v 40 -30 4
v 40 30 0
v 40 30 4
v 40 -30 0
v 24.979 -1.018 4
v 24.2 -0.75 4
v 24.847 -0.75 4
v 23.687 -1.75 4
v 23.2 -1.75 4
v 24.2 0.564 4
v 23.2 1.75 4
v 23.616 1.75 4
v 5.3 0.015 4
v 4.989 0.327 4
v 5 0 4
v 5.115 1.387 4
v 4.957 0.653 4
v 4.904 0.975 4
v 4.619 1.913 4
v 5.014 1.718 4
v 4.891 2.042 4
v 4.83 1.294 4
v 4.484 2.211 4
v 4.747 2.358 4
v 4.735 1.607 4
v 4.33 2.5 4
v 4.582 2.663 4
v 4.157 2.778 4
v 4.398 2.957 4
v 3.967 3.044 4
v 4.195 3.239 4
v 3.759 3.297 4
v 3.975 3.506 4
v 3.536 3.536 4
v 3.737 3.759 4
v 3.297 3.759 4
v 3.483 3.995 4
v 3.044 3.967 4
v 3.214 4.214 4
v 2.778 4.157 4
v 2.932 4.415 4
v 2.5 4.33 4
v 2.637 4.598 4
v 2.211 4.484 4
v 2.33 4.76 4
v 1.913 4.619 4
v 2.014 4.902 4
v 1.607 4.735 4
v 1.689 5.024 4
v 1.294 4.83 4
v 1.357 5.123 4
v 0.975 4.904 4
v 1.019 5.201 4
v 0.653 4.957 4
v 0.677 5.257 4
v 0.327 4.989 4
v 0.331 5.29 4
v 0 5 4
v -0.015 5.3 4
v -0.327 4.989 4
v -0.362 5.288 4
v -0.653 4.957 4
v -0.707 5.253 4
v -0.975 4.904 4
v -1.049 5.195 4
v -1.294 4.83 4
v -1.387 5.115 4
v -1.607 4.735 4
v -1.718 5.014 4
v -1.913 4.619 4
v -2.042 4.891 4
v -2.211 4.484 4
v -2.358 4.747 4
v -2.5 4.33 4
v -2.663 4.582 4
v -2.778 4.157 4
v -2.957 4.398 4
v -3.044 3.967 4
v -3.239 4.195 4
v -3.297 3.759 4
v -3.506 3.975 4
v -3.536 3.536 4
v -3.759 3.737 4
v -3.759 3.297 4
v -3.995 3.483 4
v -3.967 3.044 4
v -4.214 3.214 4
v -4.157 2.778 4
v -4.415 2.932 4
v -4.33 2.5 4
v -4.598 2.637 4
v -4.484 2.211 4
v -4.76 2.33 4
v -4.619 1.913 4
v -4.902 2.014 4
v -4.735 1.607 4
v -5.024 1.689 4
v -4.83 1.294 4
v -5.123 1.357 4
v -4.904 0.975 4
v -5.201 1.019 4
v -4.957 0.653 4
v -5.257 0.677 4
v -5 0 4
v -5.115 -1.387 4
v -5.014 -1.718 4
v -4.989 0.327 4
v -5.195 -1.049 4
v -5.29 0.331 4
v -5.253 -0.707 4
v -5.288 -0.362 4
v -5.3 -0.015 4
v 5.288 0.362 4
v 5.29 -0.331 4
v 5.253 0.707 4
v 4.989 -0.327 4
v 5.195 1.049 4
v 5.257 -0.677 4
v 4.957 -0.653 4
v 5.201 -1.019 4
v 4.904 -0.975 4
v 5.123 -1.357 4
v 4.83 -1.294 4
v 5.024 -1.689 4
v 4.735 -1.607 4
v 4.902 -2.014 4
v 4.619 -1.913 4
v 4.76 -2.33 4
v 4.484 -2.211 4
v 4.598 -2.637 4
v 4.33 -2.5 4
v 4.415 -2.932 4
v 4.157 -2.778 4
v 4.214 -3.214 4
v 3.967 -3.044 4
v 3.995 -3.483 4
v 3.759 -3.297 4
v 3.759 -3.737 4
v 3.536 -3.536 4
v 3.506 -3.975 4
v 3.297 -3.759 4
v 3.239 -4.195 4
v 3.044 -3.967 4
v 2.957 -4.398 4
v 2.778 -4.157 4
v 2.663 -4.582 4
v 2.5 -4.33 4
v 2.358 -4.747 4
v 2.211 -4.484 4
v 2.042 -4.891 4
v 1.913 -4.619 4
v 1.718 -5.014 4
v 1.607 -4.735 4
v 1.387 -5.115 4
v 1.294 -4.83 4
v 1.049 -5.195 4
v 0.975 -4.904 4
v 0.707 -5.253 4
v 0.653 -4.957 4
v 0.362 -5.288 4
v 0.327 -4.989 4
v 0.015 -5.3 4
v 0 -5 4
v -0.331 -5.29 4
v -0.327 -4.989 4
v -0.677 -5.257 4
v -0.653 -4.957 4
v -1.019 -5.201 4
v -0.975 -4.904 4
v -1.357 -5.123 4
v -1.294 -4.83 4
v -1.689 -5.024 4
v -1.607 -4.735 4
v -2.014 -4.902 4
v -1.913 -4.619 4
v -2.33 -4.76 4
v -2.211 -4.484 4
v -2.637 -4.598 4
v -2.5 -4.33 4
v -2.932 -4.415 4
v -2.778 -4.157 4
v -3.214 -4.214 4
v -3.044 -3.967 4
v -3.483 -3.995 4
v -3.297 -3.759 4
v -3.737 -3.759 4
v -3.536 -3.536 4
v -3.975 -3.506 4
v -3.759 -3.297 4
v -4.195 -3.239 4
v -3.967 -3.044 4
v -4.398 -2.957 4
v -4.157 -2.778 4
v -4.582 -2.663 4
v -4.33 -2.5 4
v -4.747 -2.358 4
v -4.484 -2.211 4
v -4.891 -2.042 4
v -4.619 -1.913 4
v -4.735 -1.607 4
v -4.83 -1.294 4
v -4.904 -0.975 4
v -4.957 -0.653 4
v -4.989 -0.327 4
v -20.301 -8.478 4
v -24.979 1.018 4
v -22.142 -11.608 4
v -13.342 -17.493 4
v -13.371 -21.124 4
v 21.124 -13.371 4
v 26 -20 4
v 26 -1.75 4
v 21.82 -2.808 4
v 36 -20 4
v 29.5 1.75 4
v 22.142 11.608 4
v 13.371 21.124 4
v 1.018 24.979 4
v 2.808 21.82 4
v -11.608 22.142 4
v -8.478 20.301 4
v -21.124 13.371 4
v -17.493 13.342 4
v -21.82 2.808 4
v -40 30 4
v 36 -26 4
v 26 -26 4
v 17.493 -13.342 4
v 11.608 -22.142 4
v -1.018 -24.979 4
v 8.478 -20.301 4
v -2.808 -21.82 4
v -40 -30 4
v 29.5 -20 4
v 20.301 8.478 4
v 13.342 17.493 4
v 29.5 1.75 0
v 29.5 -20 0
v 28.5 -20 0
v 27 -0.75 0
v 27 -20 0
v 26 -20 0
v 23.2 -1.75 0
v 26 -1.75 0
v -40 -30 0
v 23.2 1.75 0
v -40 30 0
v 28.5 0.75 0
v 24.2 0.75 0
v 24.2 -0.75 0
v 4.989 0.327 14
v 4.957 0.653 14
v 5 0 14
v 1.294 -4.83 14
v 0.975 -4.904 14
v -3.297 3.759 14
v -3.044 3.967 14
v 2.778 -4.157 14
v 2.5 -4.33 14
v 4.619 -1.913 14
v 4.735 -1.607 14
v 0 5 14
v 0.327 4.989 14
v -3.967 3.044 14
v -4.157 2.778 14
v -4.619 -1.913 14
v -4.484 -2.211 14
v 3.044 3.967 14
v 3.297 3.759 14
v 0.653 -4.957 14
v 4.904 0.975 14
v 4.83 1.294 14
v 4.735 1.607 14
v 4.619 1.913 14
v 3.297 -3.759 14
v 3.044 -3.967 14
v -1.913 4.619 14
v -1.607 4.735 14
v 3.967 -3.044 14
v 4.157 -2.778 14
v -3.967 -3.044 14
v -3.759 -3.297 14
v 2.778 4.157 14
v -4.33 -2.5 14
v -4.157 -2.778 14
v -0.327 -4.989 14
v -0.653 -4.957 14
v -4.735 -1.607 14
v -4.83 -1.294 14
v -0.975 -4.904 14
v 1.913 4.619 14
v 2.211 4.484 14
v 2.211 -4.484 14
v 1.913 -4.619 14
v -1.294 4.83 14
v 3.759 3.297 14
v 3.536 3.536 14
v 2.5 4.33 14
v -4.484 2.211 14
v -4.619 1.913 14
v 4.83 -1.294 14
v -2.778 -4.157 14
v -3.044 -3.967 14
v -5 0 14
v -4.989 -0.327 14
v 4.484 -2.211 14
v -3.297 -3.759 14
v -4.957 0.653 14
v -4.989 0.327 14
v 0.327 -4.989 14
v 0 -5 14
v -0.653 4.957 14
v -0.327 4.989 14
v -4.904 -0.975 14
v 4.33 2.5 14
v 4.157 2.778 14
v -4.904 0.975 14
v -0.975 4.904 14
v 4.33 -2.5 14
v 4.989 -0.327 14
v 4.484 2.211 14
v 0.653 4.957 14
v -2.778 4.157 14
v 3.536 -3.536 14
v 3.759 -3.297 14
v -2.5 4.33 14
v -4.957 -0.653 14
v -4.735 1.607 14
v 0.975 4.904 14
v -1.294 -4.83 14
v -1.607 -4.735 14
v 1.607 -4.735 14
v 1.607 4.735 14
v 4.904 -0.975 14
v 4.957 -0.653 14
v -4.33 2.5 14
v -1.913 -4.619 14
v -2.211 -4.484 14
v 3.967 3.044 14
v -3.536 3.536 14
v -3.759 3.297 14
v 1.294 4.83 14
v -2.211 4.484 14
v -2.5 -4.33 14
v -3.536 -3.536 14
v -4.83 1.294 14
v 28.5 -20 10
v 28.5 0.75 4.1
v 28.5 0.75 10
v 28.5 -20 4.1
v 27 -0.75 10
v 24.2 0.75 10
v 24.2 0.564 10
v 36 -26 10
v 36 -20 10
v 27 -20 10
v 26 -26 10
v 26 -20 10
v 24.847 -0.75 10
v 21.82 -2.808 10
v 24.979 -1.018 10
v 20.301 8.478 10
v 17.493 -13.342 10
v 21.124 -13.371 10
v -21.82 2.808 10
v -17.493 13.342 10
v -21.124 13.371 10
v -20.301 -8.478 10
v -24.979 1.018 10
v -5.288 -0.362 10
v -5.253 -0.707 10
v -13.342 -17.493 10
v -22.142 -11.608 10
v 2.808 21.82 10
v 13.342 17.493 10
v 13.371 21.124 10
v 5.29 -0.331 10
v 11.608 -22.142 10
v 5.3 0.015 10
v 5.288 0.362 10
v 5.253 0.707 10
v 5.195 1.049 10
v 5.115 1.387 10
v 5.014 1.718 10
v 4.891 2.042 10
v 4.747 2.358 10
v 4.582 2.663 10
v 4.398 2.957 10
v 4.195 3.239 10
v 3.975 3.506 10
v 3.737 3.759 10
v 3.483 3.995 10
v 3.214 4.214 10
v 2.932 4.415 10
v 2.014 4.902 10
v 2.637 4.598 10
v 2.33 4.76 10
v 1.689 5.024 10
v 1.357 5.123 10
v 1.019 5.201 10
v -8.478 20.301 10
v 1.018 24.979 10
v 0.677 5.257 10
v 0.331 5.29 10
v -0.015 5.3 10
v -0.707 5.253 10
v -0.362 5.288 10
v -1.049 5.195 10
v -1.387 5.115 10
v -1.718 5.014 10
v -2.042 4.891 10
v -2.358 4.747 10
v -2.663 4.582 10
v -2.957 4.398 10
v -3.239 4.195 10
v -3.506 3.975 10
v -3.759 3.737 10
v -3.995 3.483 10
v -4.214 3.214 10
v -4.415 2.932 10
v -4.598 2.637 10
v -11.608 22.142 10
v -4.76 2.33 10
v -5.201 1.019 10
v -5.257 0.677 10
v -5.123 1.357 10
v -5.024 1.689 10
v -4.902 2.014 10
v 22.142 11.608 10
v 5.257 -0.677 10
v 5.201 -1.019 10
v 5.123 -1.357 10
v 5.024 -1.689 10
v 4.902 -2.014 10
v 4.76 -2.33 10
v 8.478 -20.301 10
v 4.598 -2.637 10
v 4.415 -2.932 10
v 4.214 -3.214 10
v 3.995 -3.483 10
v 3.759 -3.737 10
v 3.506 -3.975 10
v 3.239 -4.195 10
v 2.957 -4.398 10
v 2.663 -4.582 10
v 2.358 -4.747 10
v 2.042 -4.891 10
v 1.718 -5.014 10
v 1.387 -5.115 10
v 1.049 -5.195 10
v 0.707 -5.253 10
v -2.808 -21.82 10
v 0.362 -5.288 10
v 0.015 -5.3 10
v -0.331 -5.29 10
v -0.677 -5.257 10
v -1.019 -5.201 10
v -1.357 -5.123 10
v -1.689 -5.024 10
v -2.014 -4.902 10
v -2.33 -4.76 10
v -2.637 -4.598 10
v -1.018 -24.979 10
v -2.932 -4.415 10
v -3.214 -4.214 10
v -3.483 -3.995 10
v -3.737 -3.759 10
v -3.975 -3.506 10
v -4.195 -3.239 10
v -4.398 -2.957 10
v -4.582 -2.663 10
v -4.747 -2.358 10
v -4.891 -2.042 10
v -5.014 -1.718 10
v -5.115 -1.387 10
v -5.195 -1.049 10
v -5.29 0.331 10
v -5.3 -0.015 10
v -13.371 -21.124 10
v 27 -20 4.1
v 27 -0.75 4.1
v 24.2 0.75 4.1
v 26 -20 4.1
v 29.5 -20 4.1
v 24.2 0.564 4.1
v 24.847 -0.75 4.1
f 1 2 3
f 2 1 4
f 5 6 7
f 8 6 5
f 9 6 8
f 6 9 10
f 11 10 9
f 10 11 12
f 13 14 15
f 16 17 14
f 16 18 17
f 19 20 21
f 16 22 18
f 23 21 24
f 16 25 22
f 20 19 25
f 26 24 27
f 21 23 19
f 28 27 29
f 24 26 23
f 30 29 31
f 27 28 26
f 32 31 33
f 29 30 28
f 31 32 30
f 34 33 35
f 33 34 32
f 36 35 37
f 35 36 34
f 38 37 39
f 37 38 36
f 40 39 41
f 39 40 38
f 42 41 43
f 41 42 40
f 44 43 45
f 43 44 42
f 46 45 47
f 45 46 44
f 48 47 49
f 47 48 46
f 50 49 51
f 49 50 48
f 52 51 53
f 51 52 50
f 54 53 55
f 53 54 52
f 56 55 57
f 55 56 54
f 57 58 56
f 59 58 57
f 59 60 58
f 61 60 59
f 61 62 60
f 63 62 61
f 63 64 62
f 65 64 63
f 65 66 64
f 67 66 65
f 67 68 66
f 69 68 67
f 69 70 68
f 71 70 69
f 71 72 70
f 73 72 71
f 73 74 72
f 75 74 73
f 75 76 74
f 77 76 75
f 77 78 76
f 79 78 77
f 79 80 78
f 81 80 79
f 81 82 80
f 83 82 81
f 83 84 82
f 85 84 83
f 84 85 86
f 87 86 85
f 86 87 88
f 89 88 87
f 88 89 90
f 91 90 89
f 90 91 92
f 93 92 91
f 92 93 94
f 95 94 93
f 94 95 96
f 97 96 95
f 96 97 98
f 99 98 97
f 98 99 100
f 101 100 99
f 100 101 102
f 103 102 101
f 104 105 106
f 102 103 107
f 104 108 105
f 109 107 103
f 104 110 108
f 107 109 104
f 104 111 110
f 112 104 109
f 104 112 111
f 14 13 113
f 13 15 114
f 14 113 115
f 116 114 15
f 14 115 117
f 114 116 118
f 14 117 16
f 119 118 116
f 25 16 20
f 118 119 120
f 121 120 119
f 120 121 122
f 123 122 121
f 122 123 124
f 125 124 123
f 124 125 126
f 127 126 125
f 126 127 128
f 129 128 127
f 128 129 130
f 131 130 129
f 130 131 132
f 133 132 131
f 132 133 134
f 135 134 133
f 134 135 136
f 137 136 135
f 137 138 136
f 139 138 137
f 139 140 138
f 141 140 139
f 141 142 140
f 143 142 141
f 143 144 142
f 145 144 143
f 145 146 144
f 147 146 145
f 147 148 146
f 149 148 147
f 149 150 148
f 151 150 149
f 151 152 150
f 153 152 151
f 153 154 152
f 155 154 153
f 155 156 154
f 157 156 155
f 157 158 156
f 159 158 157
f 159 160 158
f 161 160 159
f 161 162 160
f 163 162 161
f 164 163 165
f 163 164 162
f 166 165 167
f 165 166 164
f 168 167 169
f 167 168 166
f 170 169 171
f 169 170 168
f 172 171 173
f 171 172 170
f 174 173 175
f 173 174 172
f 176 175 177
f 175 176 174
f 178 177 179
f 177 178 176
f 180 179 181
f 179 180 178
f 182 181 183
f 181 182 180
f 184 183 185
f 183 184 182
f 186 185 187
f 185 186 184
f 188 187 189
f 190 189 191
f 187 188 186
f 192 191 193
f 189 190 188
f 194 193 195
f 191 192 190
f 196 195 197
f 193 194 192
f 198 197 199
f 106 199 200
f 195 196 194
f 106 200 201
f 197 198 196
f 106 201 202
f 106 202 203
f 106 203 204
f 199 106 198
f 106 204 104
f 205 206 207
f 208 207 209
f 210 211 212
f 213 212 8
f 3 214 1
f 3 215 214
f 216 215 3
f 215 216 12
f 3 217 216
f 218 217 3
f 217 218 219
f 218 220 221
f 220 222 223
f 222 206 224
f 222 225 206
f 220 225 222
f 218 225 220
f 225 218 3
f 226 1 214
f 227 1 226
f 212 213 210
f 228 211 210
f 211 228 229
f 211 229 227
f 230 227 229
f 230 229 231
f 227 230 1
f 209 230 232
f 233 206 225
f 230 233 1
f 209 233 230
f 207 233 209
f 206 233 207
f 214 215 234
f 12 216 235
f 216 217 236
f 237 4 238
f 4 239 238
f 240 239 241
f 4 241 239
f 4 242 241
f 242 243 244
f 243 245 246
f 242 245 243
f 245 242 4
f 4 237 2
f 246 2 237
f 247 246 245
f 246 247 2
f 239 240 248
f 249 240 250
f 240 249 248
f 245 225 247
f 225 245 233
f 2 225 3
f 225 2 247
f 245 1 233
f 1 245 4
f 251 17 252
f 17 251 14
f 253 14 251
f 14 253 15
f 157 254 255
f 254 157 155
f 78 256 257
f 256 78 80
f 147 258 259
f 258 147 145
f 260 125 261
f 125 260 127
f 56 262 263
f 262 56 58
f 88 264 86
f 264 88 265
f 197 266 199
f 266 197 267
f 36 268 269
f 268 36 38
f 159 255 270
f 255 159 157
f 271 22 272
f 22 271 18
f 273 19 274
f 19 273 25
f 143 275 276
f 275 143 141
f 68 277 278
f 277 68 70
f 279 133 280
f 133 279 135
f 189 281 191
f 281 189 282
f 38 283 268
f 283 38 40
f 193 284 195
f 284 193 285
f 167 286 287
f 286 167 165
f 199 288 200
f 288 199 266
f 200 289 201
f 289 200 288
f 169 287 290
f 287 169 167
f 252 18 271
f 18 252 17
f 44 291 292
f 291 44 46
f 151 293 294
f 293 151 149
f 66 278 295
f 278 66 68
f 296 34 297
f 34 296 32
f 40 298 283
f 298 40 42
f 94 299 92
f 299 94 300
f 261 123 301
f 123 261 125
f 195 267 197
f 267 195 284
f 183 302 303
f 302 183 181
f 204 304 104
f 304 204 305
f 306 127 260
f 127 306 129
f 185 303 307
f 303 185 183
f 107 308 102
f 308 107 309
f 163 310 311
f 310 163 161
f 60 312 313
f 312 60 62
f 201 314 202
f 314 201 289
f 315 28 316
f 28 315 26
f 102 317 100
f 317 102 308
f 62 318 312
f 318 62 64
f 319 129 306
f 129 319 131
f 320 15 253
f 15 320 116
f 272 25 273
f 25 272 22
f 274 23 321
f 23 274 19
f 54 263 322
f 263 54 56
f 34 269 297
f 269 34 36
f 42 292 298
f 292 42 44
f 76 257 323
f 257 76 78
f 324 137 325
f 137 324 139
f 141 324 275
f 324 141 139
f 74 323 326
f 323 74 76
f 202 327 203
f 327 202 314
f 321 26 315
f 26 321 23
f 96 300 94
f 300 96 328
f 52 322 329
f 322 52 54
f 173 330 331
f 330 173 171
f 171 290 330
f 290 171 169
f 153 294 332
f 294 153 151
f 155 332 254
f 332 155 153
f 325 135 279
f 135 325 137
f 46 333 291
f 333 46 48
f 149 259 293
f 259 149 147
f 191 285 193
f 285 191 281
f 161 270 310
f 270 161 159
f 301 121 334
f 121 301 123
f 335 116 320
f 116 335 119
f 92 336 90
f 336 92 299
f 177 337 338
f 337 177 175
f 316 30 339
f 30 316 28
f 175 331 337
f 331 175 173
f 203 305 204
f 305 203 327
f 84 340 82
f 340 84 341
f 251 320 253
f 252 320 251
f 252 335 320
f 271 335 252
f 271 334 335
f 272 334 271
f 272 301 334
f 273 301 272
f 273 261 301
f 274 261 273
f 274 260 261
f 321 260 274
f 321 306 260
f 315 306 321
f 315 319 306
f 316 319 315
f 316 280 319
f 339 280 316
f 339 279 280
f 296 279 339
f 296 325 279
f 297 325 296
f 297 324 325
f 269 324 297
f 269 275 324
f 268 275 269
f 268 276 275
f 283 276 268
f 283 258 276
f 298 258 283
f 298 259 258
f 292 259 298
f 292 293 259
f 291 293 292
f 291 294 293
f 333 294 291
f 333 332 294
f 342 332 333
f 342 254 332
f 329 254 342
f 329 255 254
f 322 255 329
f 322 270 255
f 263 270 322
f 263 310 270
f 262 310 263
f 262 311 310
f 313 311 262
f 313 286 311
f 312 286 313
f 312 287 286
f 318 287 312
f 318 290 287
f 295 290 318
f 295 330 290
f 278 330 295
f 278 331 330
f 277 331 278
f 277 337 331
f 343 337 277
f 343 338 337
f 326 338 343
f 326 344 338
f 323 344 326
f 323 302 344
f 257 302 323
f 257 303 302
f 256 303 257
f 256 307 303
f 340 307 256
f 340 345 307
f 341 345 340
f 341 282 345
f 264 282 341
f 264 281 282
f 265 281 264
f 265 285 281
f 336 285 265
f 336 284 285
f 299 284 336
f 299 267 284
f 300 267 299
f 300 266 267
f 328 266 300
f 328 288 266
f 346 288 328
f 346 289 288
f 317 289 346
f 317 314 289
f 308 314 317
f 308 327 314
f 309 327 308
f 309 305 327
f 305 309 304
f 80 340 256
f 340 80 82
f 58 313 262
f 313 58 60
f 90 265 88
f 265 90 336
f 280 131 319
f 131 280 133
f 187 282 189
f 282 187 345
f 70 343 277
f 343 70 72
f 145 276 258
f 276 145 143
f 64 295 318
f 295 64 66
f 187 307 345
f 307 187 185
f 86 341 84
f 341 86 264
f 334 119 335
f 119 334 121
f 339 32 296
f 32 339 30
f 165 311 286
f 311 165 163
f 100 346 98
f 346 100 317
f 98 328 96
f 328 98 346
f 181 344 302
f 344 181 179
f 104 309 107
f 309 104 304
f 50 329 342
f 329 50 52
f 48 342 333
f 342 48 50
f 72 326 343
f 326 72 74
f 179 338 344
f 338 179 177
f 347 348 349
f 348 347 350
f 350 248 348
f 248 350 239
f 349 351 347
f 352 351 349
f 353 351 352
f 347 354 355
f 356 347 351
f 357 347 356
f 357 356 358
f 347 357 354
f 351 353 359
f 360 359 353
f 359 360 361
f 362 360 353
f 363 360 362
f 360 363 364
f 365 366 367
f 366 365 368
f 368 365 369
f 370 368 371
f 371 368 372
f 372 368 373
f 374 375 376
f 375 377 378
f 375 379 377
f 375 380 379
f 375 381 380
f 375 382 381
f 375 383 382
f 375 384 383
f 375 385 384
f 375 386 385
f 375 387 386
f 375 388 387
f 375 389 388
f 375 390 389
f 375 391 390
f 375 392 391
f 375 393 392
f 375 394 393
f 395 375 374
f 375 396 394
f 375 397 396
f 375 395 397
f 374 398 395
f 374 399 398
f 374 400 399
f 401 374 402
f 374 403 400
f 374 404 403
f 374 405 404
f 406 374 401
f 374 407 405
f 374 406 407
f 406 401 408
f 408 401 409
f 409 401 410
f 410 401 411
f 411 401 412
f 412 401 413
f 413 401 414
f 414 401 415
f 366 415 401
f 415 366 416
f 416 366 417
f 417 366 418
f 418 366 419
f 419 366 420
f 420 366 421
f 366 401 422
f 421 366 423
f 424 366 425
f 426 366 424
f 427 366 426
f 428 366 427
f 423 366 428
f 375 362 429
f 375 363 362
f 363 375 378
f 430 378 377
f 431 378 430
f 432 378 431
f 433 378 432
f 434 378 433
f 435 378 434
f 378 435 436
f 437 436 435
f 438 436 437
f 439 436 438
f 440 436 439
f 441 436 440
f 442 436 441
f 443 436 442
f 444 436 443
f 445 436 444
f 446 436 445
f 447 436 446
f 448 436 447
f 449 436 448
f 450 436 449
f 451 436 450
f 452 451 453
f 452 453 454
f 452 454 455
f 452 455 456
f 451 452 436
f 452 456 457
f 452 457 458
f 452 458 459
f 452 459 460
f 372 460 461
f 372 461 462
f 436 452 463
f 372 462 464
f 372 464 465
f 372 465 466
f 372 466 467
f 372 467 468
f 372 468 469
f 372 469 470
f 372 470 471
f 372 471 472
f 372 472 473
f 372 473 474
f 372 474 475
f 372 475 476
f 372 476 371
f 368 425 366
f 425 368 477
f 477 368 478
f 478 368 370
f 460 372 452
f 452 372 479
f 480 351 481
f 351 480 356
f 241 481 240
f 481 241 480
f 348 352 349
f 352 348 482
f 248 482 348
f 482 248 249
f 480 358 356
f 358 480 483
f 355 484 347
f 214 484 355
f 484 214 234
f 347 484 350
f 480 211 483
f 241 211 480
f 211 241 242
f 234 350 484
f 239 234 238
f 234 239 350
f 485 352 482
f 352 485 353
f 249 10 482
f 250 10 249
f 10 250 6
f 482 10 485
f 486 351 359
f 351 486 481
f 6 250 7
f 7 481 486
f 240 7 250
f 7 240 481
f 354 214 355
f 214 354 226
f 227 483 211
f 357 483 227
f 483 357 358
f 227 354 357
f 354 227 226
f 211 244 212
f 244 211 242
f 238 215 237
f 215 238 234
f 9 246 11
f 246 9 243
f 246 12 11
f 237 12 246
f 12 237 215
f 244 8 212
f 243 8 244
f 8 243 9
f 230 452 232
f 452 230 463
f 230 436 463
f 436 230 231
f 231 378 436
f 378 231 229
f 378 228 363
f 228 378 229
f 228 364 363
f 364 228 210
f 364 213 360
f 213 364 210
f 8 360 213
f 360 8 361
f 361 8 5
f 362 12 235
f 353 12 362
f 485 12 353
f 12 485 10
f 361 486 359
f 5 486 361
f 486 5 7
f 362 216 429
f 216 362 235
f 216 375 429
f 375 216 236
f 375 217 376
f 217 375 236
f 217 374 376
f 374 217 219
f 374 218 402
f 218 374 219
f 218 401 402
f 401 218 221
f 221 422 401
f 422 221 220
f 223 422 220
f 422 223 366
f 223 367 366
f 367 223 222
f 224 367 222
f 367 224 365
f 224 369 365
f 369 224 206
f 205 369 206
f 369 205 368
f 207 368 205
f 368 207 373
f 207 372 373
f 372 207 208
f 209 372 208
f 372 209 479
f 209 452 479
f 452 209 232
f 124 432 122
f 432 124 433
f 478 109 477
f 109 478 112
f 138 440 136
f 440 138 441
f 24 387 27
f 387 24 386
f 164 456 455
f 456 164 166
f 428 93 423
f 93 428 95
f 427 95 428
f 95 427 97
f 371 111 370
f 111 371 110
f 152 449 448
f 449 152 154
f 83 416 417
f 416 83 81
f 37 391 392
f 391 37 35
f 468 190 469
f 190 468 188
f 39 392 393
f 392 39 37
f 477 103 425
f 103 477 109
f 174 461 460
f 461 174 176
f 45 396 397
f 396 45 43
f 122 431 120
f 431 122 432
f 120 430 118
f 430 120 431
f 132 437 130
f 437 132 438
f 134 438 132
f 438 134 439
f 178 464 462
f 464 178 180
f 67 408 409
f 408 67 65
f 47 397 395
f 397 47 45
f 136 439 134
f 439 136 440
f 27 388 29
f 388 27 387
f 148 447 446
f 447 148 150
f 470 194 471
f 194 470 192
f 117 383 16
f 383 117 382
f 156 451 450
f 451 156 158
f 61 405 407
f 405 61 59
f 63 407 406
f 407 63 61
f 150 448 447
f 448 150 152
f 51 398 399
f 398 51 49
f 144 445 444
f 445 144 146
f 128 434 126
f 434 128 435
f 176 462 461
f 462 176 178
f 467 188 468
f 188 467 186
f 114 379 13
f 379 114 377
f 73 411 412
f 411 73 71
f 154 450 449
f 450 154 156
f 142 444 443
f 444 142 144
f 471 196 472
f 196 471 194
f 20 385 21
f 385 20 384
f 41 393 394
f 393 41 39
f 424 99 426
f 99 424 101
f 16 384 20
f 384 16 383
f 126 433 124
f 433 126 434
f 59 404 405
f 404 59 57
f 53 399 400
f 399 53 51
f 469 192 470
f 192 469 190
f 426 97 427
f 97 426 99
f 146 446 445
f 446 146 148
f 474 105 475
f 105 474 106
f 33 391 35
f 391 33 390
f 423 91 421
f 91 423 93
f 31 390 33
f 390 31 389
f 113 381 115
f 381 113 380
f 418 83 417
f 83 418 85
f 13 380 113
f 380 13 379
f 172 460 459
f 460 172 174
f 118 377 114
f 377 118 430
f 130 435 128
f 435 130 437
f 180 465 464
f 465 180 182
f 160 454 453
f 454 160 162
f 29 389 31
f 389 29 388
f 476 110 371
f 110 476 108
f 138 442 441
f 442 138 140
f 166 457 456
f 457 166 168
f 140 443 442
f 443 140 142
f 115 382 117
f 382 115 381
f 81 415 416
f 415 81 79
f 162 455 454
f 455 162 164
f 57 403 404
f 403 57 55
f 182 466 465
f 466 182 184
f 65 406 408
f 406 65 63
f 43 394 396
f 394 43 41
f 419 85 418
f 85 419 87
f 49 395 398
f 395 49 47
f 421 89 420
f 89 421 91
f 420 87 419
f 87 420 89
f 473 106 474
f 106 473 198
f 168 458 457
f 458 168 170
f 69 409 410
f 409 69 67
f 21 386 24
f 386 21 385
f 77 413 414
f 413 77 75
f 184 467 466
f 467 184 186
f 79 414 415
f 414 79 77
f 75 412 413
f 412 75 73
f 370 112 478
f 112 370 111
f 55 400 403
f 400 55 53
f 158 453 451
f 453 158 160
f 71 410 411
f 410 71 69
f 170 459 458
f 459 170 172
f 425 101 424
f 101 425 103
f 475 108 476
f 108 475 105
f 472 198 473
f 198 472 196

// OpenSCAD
cadverify_only = "";
module instance(name, part, unit = 1) {
    echo(cadverify_instance = [name, part, unit]);
    if (cadverify_only == "" || cadverify_only == name) children();
}

// Part selector: base, wheel, assembly
part = "assembly"; // [base, wheel, assembly]

$fn = 96;

// Parameters
Rt = 25;        // wheel tip radius (50mm across)
Rr = 22;        // wheel root radius
Nteeth = 12;
wheel_t = 6;    // wheel thickness
bore_r = 5.3;   // wheel bore radius (post 5.0 + 0.3 clearance)
post_r = 5;
post_h = 14;    // base bottom to post top
base_t = 4;     // base plate thickness
plate_x = 80;
plate_y = 60;
gap_angle = 37.3333333; // gap center for nominal assembly

module wheel() {
    pts = [ for (k=[0:2*Nteeth-1])
        let(i=floor(k/2),
            a = (k%2==0) ? i*360/Nteeth : i*360/Nteeth+5,
            r = (k%2==0) ? Rr : Rt)
        [r*cos(a), r*sin(a)] ];
    difference() {
        linear_extrude(height=wheel_t, convexity=4)
            polygon(pts);
        translate([0,0,-0.1])
            cylinder(h=wheel_t+0.2, r=bore_r);
    }
}

module base() {
    difference() {
        union() {
            // plate
            translate([-plate_x/2, -plate_y/2, 0])
                cube([plate_x, plate_y, base_t]);
            // post
            cylinder(h=post_h, r=post_r);
            // pawl backbone (tall)
            translate([27, -20, 0])
                cube([1.5, 20.75, 10]);
            // pawl finger (tall, radial)
            translate([24.2, -0.75, 0])
                cube([4.3, 1.5, 10]);
            // anchor block (full height fixation)
            translate([26, -26, 0])
                cube([10, 6, 10]);
        }
        // slot voids through plate (z -0.1..4.1)
        translate([26, -20, -0.1]) cube([1, 19.25, 4.2]);      // west of backbone
        translate([28.5, -20, -0.1]) cube([1, 20.75, 4.2]);    // east of backbone
        translate([23.2, 0.75, -0.1]) cube([6.3, 1, 4.2]);      // north
        translate([23.2, -1.75, -0.1]) cube([3.8, 1, 4.2]);     // south of finger tip
        translate([23.2, -1.75, -0.1]) cube([1, 3.5, 4.2]);     // west of tip
    }
}

if (part == "wheel") {
    echo(cadverify_spec = [
        ["bounds", [[-25, -25, 0], [25, 25, 6]]],
        ["bodies", 1],
        ["through_holes", 1],
        ["support_faces", [["bottom", "-z", 1000]]],
        ["overhangs_allowed", []],
        ["copies", 1],
        ["details", [
            ["hub", "material", [[5, 5, 0.5], [10, 10, 5.5]], 0.9],
            ["bore", "hole", [0, 0, 7], [0, 0, -1], [[0, 10.6], [5, 10.6]]],
            ["rim", "thickness", [15, 0, 7], [0, 0, -1], 6],
            ["teeth", "view", [[20, -15, 0], [25, 15, 6]]]
        ]]
    ]);
    wheel();
} else if (part == "base") {
    echo(cadverify_spec = [
        ["bounds", [[-40, -30, 0], [40, 30, 14]]],
        ["bodies", 1],
        ["through_holes", 1],
        ["support_faces", [["bottom", "-z", 4000]]],
        ["overhangs_allowed", []],
        ["copies", 1],
        ["details", [
            ["pawl_arm", "material", [[27.1, -10, 4.1], [28.4, -5, 9.9]], 0.9],
            ["slot", "void", [[26.1, -15, 0.5], [26.9, -5, 3.5]], 0.9],
            ["base_floor", "thickness", [-20, 20, -1], [0, 0, 1], 4],
            ["pawl_tip", "view", [[23, -2, 4], [26, 2, 10]]]
        ]]
    ]);
    base();
} else if (part == "assembly") {
    echo(cadverify_spec = [
        ["bounds", [[-40, -30, 0], [40, 30, 14]]],
        ["support_faces", [["table", "-z", 4000]]],
        ["motions", [
            ["free", ["wheel1"], "rotate", [0, 0, 4], [0, 0, 1], [0, -30],
                ["flex", [["wheel1", "base1", 1.0, "pawl arm bends as tooth passes"]]]],
            ["locked", ["wheel1"], "rotate", [0, 0, 4], [0, 0, 1], [0, 8],
                ["stops", [8]]]
        ]],
        ["assembly_order", [
            [["base1"], [0, 0, 0]],
            [["wheel1"], [0, 0, 1]]
        ]]
    ]);
    instance("base1", "base") base();
    instance("wheel1", "wheel") translate([0, 0, 4]) rotate([0, 0, -gap_angle]) wheel();
}
